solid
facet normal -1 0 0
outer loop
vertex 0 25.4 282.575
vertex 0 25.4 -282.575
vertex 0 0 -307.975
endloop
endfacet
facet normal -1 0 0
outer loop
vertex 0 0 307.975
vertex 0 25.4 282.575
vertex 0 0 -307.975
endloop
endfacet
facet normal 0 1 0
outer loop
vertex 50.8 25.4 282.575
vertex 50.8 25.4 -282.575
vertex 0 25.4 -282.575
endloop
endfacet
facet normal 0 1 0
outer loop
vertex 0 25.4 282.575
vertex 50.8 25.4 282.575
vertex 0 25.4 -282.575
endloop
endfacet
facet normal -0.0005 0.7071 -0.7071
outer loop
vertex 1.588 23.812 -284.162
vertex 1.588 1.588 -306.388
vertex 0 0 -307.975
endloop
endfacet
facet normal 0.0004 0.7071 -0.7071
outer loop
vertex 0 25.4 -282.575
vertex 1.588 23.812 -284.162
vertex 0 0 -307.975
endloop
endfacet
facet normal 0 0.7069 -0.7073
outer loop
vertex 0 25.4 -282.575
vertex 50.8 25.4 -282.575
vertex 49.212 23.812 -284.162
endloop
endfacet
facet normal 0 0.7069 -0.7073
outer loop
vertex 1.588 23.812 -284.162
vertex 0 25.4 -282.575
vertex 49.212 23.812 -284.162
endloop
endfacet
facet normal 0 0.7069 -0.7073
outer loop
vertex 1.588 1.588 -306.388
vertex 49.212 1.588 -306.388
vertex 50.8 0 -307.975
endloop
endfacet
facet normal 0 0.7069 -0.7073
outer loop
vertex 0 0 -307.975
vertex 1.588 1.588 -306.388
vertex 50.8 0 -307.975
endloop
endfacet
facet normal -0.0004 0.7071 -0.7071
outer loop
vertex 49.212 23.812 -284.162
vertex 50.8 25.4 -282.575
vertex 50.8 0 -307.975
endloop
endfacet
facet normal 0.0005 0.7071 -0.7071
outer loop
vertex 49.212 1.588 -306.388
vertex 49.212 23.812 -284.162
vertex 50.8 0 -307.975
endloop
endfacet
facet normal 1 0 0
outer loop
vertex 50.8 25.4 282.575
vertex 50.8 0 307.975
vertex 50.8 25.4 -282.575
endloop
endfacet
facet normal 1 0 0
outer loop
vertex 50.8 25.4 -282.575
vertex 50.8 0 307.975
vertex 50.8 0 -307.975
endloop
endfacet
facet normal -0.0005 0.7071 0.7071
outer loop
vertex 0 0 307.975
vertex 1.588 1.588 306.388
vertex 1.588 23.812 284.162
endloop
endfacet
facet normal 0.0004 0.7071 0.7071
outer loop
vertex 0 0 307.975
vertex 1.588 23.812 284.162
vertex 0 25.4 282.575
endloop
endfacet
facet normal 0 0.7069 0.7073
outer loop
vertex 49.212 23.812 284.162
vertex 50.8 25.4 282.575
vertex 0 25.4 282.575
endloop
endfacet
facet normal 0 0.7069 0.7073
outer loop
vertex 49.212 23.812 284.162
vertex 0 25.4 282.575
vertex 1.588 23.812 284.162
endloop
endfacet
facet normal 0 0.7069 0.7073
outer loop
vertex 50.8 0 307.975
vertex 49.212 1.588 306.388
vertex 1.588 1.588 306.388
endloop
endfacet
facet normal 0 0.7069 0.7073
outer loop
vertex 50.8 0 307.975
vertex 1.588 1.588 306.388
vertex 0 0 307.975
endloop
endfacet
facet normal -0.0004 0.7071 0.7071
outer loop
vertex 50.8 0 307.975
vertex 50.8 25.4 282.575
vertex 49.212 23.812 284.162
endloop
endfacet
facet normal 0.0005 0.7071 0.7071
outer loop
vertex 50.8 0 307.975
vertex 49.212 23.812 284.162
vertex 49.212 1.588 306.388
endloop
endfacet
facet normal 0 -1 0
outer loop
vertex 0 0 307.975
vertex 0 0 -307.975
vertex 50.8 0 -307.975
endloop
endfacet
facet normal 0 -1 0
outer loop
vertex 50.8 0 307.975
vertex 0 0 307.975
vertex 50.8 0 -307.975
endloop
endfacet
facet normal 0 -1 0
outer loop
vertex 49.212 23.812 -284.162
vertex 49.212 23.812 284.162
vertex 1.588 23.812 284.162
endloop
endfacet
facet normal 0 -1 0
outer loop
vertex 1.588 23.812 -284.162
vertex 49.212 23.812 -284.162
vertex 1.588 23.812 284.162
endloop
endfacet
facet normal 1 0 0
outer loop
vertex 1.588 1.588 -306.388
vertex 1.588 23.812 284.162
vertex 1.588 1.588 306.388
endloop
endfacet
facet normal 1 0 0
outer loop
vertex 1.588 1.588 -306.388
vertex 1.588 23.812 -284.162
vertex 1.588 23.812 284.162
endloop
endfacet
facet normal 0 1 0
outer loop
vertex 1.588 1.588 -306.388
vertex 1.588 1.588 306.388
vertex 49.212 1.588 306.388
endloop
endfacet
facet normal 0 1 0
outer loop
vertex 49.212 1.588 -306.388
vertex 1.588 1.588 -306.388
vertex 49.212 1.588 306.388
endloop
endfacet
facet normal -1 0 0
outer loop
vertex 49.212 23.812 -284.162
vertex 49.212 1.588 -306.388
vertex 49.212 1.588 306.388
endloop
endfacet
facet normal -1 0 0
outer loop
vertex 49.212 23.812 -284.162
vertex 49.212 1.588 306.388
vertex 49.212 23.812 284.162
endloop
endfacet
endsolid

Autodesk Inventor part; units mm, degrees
ref_plane "YZ Plane" through (0, 0, 0) normal (1, 0, 0) x (0, 1, 0)
ref_plane "XZ Plane" through (0, 0, 0) normal (0, 1, 0) x (-1, 0, 0)
ref_plane "XY Plane" through (0, 0, 0) normal (0, 0, 1) x (1, 0, 0)
sketch "Sketch1" plane through (0, 0, 0) normal (0, 0, 1) x (1, 0, 0)
  line L0 (0, 0) -> (50.8, 0)
  line L1 (50.8, 0) -> (50.8, 25.4)
  line L2 (50.8, 25.4) -> (0, 25.4)
  line L3 (0, 25.4) -> (0, 0)
  line L4 (1.5875, 1.5875) -> (49.2125, 1.5875)
  line L5 (49.2125, 1.5875) -> (49.2125, 23.8125)
  line L6 (49.2125, 23.8125) -> (1.5875, 23.8125)
  line L7 (1.5875, 23.8125) -> (1.5875, 1.5875)
  dimension "d0" = 50.8
  dimension "d1" = 25.4
  dimension "d2" = 1.5875
extrude "Extrusion1" add sketch "Sketch1" along normal mid plane 615.95
chamfer "Chamfer1" distance 25.4 angle 45 2 edges at (25.4, 25.4, 307.975) (25.4, 25.4, -307.975)
properties part number "FRA_006_FrontMainRail" material "Aluminum 6061"
